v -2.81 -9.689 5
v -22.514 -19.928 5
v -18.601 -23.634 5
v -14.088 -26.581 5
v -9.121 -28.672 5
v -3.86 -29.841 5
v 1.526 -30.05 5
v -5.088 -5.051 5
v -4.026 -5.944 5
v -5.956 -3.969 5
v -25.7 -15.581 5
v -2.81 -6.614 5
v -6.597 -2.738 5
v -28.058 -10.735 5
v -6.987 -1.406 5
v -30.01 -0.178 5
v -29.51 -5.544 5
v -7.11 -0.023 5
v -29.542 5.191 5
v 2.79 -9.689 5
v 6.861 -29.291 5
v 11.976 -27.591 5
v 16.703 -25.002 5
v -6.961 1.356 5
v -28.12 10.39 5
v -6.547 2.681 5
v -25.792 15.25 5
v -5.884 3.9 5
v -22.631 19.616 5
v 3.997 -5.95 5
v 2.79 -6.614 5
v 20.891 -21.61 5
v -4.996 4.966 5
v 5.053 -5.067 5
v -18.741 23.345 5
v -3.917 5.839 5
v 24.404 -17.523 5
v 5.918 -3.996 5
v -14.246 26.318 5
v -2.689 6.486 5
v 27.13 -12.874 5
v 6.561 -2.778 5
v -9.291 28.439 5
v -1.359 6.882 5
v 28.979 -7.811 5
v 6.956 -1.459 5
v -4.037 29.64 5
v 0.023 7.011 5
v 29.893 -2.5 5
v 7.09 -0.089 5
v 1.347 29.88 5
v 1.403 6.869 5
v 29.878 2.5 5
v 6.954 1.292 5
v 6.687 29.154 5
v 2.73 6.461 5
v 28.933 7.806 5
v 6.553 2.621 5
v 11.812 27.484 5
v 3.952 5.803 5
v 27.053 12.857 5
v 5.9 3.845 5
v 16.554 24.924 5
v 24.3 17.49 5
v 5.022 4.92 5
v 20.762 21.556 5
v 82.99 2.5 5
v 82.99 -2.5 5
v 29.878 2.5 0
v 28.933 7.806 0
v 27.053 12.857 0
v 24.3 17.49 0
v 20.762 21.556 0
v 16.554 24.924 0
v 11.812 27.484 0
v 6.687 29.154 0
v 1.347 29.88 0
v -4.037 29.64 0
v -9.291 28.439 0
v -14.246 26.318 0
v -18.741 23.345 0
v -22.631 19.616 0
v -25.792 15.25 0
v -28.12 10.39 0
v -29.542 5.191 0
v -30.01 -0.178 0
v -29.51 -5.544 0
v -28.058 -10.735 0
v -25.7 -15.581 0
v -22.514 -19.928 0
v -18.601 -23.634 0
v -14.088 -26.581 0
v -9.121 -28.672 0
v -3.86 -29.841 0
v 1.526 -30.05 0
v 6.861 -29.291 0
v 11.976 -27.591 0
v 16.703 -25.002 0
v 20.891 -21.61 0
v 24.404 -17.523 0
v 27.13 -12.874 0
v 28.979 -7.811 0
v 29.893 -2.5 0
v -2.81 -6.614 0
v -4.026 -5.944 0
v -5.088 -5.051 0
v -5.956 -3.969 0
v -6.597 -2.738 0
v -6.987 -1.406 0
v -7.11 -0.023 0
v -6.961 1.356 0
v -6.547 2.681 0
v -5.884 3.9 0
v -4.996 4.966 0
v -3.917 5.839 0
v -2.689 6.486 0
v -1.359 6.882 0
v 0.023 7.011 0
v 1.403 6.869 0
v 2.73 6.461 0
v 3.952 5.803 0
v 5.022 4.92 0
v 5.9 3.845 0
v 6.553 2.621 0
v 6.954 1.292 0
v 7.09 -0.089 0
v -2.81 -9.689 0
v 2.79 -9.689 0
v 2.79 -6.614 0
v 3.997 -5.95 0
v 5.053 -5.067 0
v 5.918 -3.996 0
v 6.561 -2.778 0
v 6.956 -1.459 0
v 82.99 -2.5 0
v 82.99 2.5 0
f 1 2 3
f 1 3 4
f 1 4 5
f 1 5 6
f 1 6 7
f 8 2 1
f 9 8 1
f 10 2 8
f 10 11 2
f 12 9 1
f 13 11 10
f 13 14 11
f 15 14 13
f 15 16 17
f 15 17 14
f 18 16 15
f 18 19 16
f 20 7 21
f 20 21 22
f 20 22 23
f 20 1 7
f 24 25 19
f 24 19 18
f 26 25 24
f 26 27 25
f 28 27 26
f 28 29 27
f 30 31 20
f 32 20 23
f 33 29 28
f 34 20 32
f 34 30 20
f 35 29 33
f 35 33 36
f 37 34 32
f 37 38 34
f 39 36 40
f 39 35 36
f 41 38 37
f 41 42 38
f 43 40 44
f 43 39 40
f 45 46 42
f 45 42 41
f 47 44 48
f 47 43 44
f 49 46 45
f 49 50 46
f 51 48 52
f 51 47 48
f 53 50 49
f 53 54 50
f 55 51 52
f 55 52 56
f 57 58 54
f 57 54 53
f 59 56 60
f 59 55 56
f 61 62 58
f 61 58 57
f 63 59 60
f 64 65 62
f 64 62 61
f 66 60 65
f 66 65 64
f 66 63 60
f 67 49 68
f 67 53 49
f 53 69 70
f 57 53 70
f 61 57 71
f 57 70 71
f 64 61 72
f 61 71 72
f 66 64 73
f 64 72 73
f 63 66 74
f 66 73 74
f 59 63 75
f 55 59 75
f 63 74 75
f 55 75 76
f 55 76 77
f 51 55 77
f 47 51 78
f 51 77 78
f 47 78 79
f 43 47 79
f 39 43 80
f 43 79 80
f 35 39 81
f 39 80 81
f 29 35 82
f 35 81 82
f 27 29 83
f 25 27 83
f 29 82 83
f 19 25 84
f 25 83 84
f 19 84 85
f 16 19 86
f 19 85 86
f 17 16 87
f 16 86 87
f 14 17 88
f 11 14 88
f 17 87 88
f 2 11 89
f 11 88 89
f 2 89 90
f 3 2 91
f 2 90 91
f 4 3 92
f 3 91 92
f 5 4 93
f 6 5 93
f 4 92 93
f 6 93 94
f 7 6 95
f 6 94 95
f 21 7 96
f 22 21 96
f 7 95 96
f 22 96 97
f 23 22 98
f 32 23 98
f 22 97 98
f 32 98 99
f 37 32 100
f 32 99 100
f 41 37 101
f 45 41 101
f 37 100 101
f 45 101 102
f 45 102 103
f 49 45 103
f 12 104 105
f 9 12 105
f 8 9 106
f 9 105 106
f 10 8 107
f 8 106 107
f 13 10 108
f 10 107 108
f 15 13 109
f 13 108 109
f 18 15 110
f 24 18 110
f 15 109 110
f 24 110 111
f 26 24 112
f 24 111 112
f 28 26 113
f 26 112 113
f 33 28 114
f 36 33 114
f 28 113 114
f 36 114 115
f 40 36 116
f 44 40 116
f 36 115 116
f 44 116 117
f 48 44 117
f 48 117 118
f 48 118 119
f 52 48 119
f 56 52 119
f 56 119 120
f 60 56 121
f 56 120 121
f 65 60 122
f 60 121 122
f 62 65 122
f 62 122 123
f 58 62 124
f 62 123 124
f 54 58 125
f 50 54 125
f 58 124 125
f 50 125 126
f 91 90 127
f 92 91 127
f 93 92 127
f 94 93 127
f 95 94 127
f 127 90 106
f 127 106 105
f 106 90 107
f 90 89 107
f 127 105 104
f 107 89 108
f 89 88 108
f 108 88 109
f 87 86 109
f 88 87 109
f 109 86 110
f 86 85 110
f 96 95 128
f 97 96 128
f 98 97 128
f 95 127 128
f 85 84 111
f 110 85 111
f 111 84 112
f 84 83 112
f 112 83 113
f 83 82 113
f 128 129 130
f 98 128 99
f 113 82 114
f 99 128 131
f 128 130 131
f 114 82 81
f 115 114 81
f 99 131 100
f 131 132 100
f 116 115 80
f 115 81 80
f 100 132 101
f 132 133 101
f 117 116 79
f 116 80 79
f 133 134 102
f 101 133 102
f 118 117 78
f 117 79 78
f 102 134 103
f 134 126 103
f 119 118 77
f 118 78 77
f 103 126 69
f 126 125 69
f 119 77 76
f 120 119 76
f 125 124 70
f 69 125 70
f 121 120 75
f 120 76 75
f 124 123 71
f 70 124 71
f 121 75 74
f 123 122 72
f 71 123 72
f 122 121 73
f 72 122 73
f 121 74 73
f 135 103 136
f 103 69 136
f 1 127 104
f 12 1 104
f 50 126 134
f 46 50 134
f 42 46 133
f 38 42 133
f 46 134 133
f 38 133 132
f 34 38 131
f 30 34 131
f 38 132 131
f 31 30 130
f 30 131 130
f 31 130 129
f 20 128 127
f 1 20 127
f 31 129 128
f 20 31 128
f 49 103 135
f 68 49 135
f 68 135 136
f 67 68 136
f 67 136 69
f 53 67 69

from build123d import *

# Parameters (mm, degrees)
F1_DEPTH = 5


with BuildPart() as f1:
    # F0 (on Top) → F1 (new body)
    with BuildSketch(Plane.XY):
        with BuildLine():
            ThreePointArc((29.892959, -2.5), (29.96573, -1.295459), (29.99, -0.088966))
            ThreePointArc((29.99, -0.088966), (29.962007, 1.206726), (29.878079, 2.5))
            ThreePointArc((29.878079, 2.5), (-30.009867, -0.178242), (29.892959, -2.5))
        make_face()
        with BuildLine():
            ThreePointArc((-2.81, -6.613535), (-3.917044, 5.839356), (7.09, -0.088966))
            ThreePointArc((7.09, -0.088966), (5.918322, -3.996011), (2.79, -6.613535))
            Line((2.79, -6.613535), (2.79, -9.688966))
            Line((2.79, -9.688966), (-0.01, -9.688966))
            Line((-0.01, -9.688966), (-2.81, -9.688966))
            Line((-2.81, -9.688966), (-2.81, -6.613535))
        make_face(mode=Mode.SUBTRACT)
        with BuildLine():
            ThreePointArc((29.878079, 2.5), (29.962007, 1.206726), (29.99, -0.088966))
            ThreePointArc((29.99, -0.088966), (29.96573, -1.295459), (29.892959, -2.5))
            Line((29.892959, -2.5), (82.989869, -2.5))
            Line((82.989869, -2.5), (82.989869, 0))
            Line((82.989869, 0), (82.989869, 2.5))
            Line((82.989869, 2.5), (29.878079, 2.5))
        make_face()
    extrude(amount=F1_DEPTH)


solid = f1.part
